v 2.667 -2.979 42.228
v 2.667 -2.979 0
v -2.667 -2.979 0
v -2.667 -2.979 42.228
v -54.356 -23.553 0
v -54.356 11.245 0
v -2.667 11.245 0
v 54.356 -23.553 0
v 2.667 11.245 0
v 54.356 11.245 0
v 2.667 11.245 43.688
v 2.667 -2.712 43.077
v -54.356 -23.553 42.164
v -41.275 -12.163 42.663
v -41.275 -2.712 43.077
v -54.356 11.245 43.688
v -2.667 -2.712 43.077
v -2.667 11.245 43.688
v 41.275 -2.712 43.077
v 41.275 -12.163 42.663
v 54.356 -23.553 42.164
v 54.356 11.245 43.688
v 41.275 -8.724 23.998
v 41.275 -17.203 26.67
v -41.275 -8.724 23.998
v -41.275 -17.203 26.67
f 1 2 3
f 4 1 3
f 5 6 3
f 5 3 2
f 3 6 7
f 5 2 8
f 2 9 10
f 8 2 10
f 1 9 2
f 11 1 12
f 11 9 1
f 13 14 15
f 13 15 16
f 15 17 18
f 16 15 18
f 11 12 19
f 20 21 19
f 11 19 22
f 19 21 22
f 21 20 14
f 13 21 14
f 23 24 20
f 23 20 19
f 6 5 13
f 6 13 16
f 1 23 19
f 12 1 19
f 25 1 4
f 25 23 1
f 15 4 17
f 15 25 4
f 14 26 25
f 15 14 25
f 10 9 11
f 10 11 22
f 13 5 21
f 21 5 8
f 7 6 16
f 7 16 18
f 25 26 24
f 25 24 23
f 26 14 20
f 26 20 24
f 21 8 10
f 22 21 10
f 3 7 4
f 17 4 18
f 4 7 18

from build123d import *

# Parameters (mm, degrees)
F0_W          = 108.712
F0_H          = 34.798
F1_DEPTH      = 43.688
F3_DEPTH      = 108.713
F4_W          = 5.334
F4_H          = 43.688
F5_DEPTH      = 14.224
F7_DEPTH      = 41.275
F7_DEPTH_BACK = 41.275


with BuildPart() as f1:
    # F0 (on Top) → F1 (new body)
    with BuildSketch(Plane.XY):
        with Locations((0, -6.154203)):
            Rectangle(F0_W, F0_H)
    extrude(amount=F1_DEPTH)

    # F2 (on face) → F3 (cut, through all)
    with BuildSketch(Plane.YZ.offset(54.356)):
        Polygon((-23.553203, 42.164), (11.244797, 43.688), (-23.553203, 43.688), align=None)
    extrude(amount=-F3_DEPTH, mode=Mode.SUBTRACT)

    # F4 (on face) → F5 (cut)
    with BuildSketch(Plane(origin=(0, 11.244797, 0), x_dir=(-1, 0, 0), z_dir=(0, 1, 0))):
        with Locations((0, 21.844)):
            Rectangle(F4_W, F4_H)
    extrude(amount=-F5_DEPTH, mode=Mode.SUBTRACT)

    # F6 (on Right) → F7 (cut, two sides)
    with BuildSketch(Plane.YZ) as f7_sk:
        Polygon((-8.7243, 23.997865), (3.653318, 63.273063), (-5.817524, 62.797693), (-17.203203, 26.67), align=None)
    extrude(amount=F7_DEPTH, mode=Mode.SUBTRACT)
    extrude(f7_sk.sketch, amount=-F7_DEPTH_BACK, mode=Mode.SUBTRACT)


solid = f1.part
